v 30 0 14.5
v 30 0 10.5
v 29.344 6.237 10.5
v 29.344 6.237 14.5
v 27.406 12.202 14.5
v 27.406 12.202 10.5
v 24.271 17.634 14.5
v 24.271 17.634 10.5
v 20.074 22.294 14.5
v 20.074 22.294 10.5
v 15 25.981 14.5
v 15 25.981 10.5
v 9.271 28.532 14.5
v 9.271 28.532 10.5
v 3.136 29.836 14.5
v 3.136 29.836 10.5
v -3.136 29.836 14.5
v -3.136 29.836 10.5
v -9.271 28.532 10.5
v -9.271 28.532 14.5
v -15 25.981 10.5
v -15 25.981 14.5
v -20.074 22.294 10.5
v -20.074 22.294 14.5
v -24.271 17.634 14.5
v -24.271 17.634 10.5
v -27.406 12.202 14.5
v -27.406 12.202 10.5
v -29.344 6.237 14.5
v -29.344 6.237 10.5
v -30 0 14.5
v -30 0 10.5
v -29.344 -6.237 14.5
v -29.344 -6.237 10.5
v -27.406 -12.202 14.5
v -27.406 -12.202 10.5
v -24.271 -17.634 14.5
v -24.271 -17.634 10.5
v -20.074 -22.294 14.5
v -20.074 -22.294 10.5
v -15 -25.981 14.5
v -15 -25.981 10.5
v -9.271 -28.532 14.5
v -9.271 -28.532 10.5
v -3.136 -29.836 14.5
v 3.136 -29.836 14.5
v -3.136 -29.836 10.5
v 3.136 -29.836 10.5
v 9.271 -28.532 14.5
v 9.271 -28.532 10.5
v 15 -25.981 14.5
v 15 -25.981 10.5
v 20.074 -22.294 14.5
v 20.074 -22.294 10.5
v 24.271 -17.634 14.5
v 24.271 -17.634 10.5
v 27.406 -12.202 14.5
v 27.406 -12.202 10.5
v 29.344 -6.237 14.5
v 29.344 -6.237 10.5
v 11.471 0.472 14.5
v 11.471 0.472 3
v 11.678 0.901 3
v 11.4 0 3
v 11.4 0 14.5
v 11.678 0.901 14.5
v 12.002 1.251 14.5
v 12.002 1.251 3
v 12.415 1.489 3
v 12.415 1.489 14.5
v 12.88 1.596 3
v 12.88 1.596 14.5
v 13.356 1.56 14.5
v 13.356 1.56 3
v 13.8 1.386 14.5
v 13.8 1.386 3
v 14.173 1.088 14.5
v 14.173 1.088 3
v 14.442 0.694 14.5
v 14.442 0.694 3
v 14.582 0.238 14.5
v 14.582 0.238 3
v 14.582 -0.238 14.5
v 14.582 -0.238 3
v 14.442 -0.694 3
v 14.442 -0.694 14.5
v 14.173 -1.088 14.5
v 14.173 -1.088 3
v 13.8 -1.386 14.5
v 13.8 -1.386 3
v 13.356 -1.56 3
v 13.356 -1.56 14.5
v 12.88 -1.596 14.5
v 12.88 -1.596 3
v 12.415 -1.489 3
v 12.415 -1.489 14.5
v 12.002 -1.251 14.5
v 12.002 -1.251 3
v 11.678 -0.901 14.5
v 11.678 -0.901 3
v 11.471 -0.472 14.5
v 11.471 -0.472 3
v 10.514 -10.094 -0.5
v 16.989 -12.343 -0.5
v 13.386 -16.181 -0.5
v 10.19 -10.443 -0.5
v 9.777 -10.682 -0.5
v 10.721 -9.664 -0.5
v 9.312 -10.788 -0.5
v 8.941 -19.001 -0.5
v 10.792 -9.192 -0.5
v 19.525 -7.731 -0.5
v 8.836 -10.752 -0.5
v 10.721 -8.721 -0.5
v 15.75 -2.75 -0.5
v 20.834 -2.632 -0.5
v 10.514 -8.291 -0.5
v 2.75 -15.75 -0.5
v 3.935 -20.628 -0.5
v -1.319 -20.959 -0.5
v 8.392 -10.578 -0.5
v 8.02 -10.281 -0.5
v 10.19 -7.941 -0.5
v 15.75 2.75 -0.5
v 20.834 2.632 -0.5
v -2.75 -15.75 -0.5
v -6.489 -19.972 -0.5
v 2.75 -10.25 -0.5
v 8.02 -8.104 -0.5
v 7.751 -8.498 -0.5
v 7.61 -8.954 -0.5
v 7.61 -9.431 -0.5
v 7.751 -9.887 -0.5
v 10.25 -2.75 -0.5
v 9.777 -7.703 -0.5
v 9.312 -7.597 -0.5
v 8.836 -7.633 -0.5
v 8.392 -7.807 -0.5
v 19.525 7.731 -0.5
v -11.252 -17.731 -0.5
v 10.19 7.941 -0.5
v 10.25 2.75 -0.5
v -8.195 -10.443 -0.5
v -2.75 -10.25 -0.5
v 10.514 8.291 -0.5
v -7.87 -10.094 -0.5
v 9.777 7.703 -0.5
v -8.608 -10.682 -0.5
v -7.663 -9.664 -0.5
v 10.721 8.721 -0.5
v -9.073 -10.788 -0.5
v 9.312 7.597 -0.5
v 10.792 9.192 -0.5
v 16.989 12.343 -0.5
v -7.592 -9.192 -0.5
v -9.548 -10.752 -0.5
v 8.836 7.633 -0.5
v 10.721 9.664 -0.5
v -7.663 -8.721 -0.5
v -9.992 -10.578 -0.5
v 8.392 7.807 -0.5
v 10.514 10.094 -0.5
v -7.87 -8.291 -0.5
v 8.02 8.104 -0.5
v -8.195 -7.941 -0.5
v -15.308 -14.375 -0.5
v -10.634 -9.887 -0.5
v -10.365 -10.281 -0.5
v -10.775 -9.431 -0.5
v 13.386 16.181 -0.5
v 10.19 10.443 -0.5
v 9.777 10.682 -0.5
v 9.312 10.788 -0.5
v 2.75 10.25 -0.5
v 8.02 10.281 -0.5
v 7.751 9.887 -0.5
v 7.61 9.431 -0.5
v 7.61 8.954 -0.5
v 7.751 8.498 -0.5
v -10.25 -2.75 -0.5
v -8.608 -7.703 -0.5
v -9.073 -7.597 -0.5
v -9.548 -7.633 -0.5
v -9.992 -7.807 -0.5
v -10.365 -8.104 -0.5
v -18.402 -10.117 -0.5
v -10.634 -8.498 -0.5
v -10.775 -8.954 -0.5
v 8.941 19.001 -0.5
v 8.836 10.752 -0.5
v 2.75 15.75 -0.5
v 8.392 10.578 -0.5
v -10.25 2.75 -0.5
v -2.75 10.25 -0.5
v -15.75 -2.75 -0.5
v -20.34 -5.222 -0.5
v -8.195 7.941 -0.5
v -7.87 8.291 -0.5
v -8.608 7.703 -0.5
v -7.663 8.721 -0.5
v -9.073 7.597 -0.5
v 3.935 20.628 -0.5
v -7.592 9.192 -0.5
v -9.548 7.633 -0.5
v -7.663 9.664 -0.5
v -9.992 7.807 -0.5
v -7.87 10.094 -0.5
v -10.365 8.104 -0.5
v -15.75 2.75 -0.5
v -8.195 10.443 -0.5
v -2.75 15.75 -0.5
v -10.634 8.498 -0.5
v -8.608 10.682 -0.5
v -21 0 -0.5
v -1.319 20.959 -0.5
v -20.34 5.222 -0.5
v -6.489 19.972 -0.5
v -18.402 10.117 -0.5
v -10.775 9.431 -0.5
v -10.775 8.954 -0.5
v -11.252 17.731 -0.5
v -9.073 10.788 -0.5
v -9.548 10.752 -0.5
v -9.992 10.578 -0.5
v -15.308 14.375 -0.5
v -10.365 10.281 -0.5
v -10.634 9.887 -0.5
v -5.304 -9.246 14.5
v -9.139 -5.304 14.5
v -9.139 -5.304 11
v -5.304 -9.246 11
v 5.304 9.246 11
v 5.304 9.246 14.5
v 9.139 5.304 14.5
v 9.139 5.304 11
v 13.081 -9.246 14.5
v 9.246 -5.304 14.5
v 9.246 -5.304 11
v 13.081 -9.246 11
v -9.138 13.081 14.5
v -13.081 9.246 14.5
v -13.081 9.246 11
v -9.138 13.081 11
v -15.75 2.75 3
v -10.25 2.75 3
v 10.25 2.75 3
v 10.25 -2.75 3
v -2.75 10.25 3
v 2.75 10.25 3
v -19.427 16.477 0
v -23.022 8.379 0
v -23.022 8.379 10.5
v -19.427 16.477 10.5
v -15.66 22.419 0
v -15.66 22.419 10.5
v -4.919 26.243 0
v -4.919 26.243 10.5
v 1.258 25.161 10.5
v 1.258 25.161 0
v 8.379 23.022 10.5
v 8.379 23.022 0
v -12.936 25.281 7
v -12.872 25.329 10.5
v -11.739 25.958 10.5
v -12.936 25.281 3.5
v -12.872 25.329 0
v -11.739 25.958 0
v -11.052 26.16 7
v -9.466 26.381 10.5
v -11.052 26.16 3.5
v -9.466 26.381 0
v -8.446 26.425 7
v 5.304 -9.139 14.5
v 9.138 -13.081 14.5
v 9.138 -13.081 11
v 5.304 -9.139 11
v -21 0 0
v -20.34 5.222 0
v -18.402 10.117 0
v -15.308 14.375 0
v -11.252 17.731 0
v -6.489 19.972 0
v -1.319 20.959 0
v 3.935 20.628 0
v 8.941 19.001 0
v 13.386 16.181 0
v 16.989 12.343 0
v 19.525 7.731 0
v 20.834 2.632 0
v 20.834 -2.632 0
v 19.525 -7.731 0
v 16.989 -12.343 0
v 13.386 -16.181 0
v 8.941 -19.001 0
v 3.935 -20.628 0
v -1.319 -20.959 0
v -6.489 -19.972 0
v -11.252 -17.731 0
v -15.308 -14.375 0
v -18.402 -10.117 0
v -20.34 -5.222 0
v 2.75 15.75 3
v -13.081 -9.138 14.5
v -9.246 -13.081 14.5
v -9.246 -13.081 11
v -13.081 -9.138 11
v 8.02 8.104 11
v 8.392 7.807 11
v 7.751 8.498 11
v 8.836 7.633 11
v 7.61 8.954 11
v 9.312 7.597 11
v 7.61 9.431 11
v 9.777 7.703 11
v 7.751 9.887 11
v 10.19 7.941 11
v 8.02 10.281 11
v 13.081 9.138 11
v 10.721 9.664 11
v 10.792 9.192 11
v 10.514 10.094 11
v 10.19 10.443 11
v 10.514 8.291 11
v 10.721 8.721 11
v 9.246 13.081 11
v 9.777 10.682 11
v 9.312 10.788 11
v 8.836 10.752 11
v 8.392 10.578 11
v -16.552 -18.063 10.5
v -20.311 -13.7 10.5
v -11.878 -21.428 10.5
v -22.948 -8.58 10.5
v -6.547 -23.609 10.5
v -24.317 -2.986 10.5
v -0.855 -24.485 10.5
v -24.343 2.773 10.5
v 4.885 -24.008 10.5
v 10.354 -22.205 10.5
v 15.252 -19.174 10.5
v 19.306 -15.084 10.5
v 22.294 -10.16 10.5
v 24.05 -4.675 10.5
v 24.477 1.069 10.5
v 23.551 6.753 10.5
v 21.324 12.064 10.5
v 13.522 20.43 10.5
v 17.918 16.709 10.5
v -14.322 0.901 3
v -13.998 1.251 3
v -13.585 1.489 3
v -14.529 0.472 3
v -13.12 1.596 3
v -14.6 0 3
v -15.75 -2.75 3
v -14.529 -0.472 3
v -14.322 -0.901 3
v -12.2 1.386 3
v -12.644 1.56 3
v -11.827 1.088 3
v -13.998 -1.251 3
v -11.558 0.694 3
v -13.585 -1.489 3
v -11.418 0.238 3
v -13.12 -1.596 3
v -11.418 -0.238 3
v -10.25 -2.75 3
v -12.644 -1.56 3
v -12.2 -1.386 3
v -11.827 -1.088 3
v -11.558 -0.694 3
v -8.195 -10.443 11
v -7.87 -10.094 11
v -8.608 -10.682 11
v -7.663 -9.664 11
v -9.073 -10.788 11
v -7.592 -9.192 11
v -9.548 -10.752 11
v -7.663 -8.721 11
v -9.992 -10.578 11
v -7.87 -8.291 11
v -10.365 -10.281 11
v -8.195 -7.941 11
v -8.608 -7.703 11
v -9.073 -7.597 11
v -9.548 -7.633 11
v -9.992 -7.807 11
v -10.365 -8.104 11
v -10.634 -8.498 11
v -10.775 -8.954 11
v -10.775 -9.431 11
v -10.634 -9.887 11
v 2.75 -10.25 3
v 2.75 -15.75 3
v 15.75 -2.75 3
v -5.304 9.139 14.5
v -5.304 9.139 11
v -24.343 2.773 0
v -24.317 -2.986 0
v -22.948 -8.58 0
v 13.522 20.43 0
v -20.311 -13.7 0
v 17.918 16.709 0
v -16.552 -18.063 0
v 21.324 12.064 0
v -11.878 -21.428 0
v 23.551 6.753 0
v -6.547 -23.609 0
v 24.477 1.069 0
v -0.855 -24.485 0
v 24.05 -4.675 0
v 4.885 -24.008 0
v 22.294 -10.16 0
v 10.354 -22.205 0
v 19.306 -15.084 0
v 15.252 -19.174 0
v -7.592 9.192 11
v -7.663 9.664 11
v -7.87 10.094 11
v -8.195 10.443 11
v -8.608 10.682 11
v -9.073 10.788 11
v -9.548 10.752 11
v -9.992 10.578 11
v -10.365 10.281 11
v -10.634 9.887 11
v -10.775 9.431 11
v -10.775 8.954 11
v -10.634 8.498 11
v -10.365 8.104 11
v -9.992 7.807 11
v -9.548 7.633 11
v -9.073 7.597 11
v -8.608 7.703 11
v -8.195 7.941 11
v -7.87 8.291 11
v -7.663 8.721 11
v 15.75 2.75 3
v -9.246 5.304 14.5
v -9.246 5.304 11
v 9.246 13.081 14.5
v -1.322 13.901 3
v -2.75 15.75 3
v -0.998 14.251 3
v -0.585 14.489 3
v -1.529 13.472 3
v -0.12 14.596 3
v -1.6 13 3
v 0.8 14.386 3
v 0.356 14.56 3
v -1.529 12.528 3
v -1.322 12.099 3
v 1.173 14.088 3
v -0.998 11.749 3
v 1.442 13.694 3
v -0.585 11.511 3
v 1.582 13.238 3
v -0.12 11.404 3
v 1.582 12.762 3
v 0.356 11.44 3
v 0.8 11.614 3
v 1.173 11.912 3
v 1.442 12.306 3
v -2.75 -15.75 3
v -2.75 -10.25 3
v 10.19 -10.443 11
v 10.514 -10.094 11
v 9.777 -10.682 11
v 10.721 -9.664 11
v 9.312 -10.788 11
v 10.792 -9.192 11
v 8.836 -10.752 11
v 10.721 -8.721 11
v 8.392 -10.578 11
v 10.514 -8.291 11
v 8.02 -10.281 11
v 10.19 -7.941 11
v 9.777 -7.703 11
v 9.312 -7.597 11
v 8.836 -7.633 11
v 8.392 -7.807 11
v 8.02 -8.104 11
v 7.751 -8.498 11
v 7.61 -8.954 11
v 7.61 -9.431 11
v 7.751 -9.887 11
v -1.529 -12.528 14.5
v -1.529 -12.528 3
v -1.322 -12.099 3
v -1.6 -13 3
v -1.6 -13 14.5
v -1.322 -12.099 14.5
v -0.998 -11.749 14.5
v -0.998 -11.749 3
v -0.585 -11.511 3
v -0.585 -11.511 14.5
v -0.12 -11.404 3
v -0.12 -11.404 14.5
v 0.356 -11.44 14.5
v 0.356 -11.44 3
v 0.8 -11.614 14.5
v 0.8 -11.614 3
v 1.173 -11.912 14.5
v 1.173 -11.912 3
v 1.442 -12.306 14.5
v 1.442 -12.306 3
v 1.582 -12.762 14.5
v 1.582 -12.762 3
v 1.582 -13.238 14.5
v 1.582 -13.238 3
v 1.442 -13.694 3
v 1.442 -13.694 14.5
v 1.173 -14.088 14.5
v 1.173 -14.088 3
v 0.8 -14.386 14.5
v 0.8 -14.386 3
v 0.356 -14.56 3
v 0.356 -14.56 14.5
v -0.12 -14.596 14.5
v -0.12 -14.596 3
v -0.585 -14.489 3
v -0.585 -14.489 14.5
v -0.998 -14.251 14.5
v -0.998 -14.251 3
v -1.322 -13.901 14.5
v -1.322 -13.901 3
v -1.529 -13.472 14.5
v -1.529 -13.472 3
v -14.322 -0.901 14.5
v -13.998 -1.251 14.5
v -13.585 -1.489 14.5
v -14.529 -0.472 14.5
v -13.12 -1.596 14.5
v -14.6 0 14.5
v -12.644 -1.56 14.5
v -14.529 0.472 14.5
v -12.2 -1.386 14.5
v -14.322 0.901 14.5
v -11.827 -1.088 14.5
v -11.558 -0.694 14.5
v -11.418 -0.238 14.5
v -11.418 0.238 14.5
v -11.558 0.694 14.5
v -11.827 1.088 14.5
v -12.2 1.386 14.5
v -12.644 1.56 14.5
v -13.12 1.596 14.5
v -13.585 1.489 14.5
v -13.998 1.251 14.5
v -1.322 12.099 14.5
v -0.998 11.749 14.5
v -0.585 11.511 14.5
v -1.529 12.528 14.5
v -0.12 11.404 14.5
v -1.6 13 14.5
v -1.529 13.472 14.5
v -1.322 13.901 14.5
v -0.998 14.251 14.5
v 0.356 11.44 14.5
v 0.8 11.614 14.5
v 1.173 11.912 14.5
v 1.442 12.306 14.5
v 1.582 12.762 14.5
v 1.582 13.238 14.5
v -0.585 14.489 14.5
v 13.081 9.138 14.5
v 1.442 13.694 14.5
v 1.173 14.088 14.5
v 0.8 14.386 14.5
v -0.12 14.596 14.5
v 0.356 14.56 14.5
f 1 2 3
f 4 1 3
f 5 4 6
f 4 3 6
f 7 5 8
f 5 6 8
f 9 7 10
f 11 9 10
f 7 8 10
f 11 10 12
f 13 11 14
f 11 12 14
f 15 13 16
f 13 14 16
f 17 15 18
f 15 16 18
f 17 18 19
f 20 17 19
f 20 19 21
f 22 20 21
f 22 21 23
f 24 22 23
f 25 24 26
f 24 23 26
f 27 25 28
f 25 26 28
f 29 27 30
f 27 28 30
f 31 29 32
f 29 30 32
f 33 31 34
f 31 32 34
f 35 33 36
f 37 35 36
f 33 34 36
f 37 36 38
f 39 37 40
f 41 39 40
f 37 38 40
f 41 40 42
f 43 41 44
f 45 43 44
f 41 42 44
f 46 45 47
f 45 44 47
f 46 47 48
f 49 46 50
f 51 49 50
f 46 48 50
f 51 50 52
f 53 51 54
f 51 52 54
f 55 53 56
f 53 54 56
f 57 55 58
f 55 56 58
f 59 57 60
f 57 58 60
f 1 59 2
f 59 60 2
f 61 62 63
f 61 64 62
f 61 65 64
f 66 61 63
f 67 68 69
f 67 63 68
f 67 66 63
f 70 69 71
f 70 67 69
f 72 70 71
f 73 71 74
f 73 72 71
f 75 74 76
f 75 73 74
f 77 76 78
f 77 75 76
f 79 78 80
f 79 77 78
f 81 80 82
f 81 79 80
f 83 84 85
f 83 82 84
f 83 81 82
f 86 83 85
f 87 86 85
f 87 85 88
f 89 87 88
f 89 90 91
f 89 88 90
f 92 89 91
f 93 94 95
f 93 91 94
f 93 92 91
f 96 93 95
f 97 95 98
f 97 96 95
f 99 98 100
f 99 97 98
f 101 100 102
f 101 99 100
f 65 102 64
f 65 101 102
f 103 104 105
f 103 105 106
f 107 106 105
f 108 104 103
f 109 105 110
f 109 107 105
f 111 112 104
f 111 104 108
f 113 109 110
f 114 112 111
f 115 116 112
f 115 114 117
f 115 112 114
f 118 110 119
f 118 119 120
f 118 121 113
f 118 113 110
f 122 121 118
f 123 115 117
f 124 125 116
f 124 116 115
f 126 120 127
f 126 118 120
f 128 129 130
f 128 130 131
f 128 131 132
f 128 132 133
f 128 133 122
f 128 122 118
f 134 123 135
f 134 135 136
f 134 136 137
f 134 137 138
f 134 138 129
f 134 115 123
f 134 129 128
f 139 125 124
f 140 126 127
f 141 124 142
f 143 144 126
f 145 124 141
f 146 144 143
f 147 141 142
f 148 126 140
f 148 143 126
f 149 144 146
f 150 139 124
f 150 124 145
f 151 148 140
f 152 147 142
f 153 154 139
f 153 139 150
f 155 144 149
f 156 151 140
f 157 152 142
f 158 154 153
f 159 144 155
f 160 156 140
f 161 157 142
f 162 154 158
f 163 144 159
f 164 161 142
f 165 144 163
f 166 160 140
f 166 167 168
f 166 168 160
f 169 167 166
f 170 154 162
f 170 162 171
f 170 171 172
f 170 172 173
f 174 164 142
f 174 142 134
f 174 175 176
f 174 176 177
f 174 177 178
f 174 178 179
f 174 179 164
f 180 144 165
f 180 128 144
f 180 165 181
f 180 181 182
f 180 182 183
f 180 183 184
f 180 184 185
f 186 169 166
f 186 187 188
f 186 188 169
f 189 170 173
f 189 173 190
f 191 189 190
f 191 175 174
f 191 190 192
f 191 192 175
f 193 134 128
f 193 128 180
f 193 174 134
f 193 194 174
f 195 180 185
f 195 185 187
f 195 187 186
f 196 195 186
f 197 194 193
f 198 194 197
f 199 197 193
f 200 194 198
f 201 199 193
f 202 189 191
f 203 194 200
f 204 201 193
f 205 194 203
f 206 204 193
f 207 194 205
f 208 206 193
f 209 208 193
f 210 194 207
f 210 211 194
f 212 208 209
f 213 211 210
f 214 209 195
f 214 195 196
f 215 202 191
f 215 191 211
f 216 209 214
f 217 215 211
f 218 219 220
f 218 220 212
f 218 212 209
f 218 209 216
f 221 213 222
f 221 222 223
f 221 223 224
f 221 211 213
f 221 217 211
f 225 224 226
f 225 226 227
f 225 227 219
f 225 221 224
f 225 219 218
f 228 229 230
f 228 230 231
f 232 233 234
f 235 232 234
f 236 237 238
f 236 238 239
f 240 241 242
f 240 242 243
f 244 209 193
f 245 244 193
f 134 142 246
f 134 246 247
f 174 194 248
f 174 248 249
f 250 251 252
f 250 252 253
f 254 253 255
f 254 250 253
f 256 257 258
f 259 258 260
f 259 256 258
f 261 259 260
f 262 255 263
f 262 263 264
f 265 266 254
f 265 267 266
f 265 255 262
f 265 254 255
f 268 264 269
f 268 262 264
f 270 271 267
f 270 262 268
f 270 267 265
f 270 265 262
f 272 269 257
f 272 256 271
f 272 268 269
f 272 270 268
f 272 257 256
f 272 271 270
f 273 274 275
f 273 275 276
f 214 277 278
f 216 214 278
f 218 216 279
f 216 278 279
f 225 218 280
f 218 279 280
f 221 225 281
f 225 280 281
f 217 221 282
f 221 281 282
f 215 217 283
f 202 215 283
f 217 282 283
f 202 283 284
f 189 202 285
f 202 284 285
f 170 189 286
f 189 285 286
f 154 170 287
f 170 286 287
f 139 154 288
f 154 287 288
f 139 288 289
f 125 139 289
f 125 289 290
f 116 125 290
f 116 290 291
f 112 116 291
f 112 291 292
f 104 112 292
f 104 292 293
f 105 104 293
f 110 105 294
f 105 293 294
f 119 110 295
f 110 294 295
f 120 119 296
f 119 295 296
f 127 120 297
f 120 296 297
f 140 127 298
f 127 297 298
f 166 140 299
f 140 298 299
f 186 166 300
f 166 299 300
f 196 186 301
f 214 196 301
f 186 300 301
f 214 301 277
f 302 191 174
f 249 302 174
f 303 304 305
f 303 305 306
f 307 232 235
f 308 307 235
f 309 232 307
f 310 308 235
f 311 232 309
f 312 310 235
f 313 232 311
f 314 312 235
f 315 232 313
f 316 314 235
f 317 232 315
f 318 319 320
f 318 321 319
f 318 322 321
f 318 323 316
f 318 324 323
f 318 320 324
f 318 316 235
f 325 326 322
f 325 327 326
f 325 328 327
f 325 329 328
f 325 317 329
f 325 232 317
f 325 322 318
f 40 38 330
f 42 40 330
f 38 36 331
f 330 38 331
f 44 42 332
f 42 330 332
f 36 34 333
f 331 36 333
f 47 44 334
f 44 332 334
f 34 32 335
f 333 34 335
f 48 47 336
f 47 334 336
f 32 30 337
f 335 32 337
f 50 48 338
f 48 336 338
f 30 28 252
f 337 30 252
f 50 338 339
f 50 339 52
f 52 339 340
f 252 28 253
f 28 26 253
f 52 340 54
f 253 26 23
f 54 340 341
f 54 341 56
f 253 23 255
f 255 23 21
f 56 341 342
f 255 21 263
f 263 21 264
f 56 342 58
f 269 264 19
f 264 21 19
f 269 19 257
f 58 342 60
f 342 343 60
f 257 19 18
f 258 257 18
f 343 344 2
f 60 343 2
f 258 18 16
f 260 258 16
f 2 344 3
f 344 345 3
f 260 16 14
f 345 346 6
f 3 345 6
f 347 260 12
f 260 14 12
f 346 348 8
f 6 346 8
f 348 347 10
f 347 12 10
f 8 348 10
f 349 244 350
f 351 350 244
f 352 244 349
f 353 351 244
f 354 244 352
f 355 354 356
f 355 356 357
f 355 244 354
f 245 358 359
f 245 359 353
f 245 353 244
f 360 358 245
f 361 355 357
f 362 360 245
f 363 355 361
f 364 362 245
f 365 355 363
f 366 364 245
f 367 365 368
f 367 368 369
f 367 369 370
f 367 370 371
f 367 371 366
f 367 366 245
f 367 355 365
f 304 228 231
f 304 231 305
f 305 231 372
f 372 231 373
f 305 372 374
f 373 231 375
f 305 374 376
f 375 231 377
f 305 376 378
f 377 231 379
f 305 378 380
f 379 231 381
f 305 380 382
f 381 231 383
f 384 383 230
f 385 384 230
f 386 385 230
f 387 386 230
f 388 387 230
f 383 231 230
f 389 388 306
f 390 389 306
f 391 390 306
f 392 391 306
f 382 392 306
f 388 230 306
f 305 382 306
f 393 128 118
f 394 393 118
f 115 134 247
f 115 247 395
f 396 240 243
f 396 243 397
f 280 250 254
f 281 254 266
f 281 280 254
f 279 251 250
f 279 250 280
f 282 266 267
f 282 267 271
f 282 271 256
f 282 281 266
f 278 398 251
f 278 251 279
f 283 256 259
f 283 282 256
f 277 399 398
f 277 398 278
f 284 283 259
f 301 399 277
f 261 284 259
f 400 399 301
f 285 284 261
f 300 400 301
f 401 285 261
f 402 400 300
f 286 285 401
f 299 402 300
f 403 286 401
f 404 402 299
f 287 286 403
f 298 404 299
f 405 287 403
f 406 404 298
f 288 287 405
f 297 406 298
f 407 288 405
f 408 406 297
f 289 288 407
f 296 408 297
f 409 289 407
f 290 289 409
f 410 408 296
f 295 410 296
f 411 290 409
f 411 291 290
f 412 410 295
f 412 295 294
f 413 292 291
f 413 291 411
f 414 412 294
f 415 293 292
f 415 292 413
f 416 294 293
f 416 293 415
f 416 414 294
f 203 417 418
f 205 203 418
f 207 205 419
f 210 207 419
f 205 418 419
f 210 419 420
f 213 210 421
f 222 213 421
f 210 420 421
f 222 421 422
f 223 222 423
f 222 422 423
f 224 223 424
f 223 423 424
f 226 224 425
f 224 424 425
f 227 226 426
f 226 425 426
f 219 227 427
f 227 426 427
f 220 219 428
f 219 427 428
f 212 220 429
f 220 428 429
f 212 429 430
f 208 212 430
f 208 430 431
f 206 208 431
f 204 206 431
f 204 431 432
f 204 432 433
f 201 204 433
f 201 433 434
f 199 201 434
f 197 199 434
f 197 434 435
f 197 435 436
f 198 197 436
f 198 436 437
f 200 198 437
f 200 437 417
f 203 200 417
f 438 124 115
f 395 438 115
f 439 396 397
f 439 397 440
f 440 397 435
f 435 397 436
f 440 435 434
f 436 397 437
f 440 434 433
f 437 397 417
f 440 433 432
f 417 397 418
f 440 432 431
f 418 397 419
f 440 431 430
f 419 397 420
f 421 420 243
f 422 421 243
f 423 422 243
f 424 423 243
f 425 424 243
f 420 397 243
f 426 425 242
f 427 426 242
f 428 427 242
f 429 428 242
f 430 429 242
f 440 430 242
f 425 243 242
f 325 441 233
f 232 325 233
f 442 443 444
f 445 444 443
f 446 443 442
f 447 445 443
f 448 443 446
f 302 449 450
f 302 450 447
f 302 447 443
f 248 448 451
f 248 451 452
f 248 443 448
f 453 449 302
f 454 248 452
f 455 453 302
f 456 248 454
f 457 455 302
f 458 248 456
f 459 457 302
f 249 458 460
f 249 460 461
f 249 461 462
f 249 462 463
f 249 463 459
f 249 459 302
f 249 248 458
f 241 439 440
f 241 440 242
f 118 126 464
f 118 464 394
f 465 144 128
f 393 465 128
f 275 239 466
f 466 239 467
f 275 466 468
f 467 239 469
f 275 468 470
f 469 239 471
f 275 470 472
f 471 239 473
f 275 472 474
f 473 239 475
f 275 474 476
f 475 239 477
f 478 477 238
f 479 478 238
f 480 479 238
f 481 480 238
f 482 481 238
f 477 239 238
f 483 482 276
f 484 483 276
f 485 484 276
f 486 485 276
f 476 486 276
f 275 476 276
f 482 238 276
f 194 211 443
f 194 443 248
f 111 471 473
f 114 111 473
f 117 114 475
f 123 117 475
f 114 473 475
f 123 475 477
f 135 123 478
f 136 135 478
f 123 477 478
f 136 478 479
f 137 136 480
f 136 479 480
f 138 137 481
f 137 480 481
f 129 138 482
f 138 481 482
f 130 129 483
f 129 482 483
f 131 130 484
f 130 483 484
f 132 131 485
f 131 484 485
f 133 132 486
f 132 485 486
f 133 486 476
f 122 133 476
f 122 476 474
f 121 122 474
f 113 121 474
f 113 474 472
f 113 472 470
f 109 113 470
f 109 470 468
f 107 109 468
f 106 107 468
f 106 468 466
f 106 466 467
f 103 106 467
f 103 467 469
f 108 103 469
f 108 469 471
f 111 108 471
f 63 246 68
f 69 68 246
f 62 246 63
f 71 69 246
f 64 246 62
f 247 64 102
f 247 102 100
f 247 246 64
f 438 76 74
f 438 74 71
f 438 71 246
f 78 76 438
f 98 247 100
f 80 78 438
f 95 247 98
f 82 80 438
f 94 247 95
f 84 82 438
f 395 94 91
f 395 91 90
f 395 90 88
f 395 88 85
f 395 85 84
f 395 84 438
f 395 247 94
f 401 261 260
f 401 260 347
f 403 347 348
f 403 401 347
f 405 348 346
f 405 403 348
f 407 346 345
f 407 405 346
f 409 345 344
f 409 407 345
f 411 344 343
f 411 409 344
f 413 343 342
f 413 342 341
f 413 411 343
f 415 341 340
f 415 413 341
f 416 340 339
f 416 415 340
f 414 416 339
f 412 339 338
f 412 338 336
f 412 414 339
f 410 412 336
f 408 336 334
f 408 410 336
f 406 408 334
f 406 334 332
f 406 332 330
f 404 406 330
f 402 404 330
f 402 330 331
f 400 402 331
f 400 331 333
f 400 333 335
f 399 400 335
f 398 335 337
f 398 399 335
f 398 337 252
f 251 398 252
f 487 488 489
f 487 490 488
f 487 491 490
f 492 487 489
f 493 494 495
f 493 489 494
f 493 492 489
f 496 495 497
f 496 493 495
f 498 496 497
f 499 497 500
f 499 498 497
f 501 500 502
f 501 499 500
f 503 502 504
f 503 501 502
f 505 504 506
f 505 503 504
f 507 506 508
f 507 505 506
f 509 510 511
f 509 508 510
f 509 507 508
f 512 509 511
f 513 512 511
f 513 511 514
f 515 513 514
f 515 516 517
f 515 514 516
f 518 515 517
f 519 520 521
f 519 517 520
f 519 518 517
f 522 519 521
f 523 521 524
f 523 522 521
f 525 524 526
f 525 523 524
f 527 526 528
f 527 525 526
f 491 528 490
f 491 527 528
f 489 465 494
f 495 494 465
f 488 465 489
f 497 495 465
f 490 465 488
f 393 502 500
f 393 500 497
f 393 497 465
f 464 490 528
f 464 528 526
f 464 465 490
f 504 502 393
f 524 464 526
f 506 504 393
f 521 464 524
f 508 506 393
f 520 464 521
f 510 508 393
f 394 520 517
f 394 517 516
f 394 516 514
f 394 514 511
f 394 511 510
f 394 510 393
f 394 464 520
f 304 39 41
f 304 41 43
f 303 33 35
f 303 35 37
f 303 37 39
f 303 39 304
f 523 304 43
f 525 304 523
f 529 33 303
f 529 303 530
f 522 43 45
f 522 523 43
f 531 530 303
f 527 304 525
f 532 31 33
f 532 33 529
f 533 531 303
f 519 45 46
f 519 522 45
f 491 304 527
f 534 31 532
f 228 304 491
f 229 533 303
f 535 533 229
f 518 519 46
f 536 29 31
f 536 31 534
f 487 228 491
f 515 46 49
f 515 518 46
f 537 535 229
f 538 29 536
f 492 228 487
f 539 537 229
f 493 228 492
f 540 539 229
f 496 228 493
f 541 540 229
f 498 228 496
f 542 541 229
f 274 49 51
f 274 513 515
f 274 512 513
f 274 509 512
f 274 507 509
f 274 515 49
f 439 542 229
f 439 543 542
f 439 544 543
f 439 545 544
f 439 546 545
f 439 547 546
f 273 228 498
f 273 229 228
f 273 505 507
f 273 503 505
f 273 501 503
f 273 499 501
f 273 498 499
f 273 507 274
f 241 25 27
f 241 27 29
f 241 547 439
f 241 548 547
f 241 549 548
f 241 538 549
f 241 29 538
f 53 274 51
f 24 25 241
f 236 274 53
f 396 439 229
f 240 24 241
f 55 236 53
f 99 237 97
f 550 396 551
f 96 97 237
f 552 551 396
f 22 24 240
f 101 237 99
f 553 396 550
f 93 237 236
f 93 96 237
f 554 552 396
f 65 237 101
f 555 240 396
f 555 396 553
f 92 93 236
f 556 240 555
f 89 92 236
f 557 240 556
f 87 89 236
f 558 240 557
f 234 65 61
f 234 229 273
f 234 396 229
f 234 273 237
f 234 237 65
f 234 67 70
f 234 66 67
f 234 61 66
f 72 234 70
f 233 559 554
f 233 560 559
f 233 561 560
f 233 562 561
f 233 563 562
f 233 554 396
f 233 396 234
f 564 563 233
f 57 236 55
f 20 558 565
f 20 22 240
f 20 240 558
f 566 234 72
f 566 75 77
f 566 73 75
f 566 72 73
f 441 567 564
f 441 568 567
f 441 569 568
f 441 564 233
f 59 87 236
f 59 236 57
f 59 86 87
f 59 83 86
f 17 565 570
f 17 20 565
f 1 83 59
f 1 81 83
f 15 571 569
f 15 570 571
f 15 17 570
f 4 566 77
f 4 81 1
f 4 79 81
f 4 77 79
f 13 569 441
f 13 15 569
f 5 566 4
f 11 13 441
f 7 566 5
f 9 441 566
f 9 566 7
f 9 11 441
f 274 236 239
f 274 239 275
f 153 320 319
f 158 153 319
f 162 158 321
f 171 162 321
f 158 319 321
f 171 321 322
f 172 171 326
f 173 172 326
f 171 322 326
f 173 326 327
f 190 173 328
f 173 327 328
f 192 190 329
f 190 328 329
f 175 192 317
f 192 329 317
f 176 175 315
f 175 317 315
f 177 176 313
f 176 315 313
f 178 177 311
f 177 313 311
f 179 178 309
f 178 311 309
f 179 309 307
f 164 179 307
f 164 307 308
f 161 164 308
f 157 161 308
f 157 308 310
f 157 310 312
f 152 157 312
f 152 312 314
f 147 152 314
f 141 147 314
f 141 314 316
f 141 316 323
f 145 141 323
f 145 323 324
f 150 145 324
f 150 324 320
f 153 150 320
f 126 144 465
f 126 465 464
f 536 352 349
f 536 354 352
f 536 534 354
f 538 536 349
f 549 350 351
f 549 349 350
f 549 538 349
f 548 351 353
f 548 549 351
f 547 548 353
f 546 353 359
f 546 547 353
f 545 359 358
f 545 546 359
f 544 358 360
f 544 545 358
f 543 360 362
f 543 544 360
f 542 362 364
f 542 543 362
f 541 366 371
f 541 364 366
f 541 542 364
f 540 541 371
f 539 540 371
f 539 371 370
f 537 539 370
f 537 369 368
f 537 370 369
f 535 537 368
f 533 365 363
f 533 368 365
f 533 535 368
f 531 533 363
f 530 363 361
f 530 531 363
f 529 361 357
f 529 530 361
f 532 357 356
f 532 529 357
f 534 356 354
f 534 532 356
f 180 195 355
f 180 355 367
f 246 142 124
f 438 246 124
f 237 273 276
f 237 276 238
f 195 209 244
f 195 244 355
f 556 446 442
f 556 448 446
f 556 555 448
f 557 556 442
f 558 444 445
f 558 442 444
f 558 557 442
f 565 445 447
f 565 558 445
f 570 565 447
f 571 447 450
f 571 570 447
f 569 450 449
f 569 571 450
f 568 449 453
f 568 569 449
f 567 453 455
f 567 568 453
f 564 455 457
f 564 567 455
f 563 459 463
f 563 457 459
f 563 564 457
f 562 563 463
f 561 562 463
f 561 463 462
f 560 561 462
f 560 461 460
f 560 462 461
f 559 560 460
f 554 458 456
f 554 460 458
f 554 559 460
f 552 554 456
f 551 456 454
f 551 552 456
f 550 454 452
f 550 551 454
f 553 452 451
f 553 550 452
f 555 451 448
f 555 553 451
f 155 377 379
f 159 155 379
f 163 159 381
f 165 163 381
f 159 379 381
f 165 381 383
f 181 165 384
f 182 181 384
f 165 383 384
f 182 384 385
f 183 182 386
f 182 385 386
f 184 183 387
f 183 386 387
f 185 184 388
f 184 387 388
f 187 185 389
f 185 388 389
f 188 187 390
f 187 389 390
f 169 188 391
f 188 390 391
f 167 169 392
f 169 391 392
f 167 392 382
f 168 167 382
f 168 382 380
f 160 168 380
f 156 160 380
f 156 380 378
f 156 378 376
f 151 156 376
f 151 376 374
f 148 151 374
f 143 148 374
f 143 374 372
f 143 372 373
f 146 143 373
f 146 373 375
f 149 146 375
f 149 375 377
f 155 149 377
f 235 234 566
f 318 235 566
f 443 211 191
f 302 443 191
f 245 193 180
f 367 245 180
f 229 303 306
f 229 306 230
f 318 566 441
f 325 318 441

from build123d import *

# Parameters (mm, degrees)
SKETCH1_R           = 21
SKETCH1_R_2         = 2.85
SKETCH1_R_3         = 1.6
BOSS_EXTRUDE1_DEPTH = 10.5
SKETCH2_R           = 24.5
SKETCH2_R_2         = 21
BOSS_EXTRUDE3_DEPTH = 10.5
SKETCH4_R           = 30
SKETCH4_R_2         = 1.6
BOSS_EXTRUDE5_DEPTH = 4
SKETCH3_R           = 21
SKETCH3_R_2         = 1.6
BOSS_EXTRUDE4_DEPTH = 0.5
SKETCH6_W           = 5.5
SKETCH6_H           = 5.5
CUT_EXTRUDE2_DEPTH  = 3.5
SKETCH7_R           = 1.6
CUT_EXTRUDE3_DEPTH  = 46.000000133
SKETCH7_3_R         = 1.6
CUT_EXTRUDE4_DEPTH  = 3.5


with BuildPart() as part:
    # Sketch1 → Boss-Extrude1 (new body)
    with BuildSketch(Plane(origin=(0, 0, 0), x_dir=(0, 1, 0), z_dir=(0, 0, 1))):
        with Locations(Location((0, 0, 0), (0, 0, 90))):
            Circle(SKETCH1_R)
        with Locations((-13, 0)):
            Circle(SKETCH1_R_2, mode=Mode.SUBTRACT)
        with Locations((0, -13)):
            Circle(SKETCH1_R_2, mode=Mode.SUBTRACT)
        with Locations((13, 0)):
            Circle(SKETCH1_R_2, mode=Mode.SUBTRACT)
        with Locations((0, 13)):
            Circle(SKETCH1_R_2, mode=Mode.SUBTRACT)
        with Locations((-13, 0)):
            Circle(SKETCH1_R_2)
        with Locations(Location((-13, 0, 0), (0, 0, 90))):
            Circle(SKETCH1_R_3, mode=Mode.SUBTRACT)
        with Locations((0, 13)):
            Circle(SKETCH1_R_2)
        with Locations(Location((0, 13, 0), (0, 0, 90))):
            Circle(SKETCH1_R_3, mode=Mode.SUBTRACT)
        with Locations((13, 0)):
            Circle(SKETCH1_R_2)
        with Locations(Location((13, 0, 0), (0, 0, 90))):
            Circle(SKETCH1_R_3, mode=Mode.SUBTRACT)
        with Locations((0, -13)):
            Circle(SKETCH1_R_2)
        with Locations(Location((0, -13, 0), (0, 0, 90))):
            Circle(SKETCH1_R_3, mode=Mode.SUBTRACT)
    extrude(amount=BOSS_EXTRUDE1_DEPTH)

    # Sketch2 → Boss-Extrude3 (add)
    with BuildSketch(Plane(origin=(0, 0, 0), x_dir=(1, 0, 0), z_dir=(0, 0, -1))):
        Circle(SKETCH2_R)
        Circle(SKETCH2_R_2, mode=Mode.SUBTRACT)
        with BuildLine():
            ThreePointArc((8.379493511, -23.022469209), (-10.354147413, -22.204540782), (-23.022469209, -8.379493511))
            add(Edge.make_bspline(
                [(-23.022469209, -8.379493511), (-19.944287919, -16.836727099), (-14.723681196, -24.624750138), (-9.399453165, -27.107478442), (-0.077740076, -26.100650499), (8.379493511, -23.022469209)],
                knots=[0, 0, 0, 0, 0.45, 0.55, 1, 1, 1, 1], degree=3))
        make_face()
    extrude(amount=-BOSS_EXTRUDE3_DEPTH)

    # Sketch4 → Boss-Extrude5 (add)
    with BuildSketch(Plane.XY.offset(10.5)):
        Circle(SKETCH4_R)
        with Locations(Location((-13, 0, 0), (0, 0, 180))):
            Circle(SKETCH4_R_2, mode=Mode.SUBTRACT)
        with Locations(Location((0, 13, 0), (0, 0, 180))):
            Circle(SKETCH4_R_2, mode=Mode.SUBTRACT)
        with Locations(Location((13, 0, 0), (0, 0, 180))):
            Circle(SKETCH4_R_2, mode=Mode.SUBTRACT)
        with Locations(Location((0, -13, 0), (0, 0, 180))):
            Circle(SKETCH4_R_2, mode=Mode.SUBTRACT)
    extrude(amount=BOSS_EXTRUDE5_DEPTH)

    # Sketch3 → Boss-Extrude4 (add)
    with BuildSketch(Plane(origin=(0, 0, 0), x_dir=(1, 0, 0), z_dir=(0, 0, -1))):
        with Locations(Location((0, 0, 0), (0, 0, 180))):
            Circle(SKETCH3_R)
        with Locations(Location((-13, 0, 0), (0, 0, 180))):
            Circle(SKETCH3_R_2, mode=Mode.SUBTRACT)
        with Locations(Location((0, 13, 0), (0, 0, 180))):
            Circle(SKETCH3_R_2, mode=Mode.SUBTRACT)
        with Locations(Location((13, 0, 0), (0, 0, 180))):
            Circle(SKETCH3_R_2, mode=Mode.SUBTRACT)
        with Locations(Location((0, -13, 0), (0, 0, 180))):
            Circle(SKETCH3_R_2, mode=Mode.SUBTRACT)
    extrude(amount=BOSS_EXTRUDE4_DEPTH)

    # Sketch6 → Cut-Extrude2 (cut)
    with BuildSketch(Plane(origin=(0, 0, -0.5), x_dir=(1, 0, 0), z_dir=(0, 0, -1))):
        with Locations((13, 0)):
            Rectangle(SKETCH6_W, SKETCH6_H)
        with Locations((0, 13)):
            Rectangle(SKETCH6_W, SKETCH6_H)
        with Locations((0, -13)):
            Rectangle(SKETCH6_W, SKETCH6_H)
        with Locations((-13, 0)):
            Rectangle(SKETCH6_W, SKETCH6_H)
    extrude(amount=-CUT_EXTRUDE2_DEPTH, mode=Mode.SUBTRACT)

    # Sketch7 → Cut-Extrude3 (cut, through all)
    with BuildSketch(Plane.XY.offset(14.5)):
        with Locations((9.192388155, 9.192388155)):
            Circle(SKETCH7_R)
        with Locations((9.192388155, -9.192388155)):
            Circle(SKETCH7_R)
        with Locations((-9.192388155, -9.192388155)):
            Circle(SKETCH7_R)
        with Locations((-9.192388155, 9.192388155)):
            Circle(SKETCH7_R)
    extrude(amount=-CUT_EXTRUDE3_DEPTH, mode=Mode.SUBTRACT)

    # Sketch7<3> → Cut-Extrude4 (cut)
    with BuildSketch(Plane.XY.offset(14.5)):
        Polygon((9.245595054, 13.080678059), (5.304110209, 9.246461763), (9.139181257, 5.304098252), (13.080666102, 9.138314547), align=None)
        with Locations((9.192388155, 9.192388155)):
            Circle(SKETCH7_3_R, mode=Mode.SUBTRACT)
        Polygon((9.138314547, -13.080666102), (5.304098252, -9.139181257), (9.246461763, -5.304110209), (13.080678059, -9.245595054), align=None)
        with Locations((9.192388155, -9.192388155)):
            Circle(SKETCH7_3_R, mode=Mode.SUBTRACT)
        Polygon((-13.080666102, -9.138314547), (-9.139181257, -5.304098252), (-5.304110209, -9.246461763), (-9.245595054, -13.080678059), align=None)
        with Locations((-9.192388155, -9.192388155)):
            Circle(SKETCH7_3_R, mode=Mode.SUBTRACT)
        Polygon((-9.138314547, 13.080666102), (-5.304098252, 9.139181257), (-9.246461763, 5.304110209), (-13.080678059, 9.245595054), align=None)
        with Locations((-9.192388155, 9.192388155)):
            Circle(SKETCH7_3_R, mode=Mode.SUBTRACT)
    extrude(amount=-CUT_EXTRUDE4_DEPTH, mode=Mode.SUBTRACT)


solid = part.part
